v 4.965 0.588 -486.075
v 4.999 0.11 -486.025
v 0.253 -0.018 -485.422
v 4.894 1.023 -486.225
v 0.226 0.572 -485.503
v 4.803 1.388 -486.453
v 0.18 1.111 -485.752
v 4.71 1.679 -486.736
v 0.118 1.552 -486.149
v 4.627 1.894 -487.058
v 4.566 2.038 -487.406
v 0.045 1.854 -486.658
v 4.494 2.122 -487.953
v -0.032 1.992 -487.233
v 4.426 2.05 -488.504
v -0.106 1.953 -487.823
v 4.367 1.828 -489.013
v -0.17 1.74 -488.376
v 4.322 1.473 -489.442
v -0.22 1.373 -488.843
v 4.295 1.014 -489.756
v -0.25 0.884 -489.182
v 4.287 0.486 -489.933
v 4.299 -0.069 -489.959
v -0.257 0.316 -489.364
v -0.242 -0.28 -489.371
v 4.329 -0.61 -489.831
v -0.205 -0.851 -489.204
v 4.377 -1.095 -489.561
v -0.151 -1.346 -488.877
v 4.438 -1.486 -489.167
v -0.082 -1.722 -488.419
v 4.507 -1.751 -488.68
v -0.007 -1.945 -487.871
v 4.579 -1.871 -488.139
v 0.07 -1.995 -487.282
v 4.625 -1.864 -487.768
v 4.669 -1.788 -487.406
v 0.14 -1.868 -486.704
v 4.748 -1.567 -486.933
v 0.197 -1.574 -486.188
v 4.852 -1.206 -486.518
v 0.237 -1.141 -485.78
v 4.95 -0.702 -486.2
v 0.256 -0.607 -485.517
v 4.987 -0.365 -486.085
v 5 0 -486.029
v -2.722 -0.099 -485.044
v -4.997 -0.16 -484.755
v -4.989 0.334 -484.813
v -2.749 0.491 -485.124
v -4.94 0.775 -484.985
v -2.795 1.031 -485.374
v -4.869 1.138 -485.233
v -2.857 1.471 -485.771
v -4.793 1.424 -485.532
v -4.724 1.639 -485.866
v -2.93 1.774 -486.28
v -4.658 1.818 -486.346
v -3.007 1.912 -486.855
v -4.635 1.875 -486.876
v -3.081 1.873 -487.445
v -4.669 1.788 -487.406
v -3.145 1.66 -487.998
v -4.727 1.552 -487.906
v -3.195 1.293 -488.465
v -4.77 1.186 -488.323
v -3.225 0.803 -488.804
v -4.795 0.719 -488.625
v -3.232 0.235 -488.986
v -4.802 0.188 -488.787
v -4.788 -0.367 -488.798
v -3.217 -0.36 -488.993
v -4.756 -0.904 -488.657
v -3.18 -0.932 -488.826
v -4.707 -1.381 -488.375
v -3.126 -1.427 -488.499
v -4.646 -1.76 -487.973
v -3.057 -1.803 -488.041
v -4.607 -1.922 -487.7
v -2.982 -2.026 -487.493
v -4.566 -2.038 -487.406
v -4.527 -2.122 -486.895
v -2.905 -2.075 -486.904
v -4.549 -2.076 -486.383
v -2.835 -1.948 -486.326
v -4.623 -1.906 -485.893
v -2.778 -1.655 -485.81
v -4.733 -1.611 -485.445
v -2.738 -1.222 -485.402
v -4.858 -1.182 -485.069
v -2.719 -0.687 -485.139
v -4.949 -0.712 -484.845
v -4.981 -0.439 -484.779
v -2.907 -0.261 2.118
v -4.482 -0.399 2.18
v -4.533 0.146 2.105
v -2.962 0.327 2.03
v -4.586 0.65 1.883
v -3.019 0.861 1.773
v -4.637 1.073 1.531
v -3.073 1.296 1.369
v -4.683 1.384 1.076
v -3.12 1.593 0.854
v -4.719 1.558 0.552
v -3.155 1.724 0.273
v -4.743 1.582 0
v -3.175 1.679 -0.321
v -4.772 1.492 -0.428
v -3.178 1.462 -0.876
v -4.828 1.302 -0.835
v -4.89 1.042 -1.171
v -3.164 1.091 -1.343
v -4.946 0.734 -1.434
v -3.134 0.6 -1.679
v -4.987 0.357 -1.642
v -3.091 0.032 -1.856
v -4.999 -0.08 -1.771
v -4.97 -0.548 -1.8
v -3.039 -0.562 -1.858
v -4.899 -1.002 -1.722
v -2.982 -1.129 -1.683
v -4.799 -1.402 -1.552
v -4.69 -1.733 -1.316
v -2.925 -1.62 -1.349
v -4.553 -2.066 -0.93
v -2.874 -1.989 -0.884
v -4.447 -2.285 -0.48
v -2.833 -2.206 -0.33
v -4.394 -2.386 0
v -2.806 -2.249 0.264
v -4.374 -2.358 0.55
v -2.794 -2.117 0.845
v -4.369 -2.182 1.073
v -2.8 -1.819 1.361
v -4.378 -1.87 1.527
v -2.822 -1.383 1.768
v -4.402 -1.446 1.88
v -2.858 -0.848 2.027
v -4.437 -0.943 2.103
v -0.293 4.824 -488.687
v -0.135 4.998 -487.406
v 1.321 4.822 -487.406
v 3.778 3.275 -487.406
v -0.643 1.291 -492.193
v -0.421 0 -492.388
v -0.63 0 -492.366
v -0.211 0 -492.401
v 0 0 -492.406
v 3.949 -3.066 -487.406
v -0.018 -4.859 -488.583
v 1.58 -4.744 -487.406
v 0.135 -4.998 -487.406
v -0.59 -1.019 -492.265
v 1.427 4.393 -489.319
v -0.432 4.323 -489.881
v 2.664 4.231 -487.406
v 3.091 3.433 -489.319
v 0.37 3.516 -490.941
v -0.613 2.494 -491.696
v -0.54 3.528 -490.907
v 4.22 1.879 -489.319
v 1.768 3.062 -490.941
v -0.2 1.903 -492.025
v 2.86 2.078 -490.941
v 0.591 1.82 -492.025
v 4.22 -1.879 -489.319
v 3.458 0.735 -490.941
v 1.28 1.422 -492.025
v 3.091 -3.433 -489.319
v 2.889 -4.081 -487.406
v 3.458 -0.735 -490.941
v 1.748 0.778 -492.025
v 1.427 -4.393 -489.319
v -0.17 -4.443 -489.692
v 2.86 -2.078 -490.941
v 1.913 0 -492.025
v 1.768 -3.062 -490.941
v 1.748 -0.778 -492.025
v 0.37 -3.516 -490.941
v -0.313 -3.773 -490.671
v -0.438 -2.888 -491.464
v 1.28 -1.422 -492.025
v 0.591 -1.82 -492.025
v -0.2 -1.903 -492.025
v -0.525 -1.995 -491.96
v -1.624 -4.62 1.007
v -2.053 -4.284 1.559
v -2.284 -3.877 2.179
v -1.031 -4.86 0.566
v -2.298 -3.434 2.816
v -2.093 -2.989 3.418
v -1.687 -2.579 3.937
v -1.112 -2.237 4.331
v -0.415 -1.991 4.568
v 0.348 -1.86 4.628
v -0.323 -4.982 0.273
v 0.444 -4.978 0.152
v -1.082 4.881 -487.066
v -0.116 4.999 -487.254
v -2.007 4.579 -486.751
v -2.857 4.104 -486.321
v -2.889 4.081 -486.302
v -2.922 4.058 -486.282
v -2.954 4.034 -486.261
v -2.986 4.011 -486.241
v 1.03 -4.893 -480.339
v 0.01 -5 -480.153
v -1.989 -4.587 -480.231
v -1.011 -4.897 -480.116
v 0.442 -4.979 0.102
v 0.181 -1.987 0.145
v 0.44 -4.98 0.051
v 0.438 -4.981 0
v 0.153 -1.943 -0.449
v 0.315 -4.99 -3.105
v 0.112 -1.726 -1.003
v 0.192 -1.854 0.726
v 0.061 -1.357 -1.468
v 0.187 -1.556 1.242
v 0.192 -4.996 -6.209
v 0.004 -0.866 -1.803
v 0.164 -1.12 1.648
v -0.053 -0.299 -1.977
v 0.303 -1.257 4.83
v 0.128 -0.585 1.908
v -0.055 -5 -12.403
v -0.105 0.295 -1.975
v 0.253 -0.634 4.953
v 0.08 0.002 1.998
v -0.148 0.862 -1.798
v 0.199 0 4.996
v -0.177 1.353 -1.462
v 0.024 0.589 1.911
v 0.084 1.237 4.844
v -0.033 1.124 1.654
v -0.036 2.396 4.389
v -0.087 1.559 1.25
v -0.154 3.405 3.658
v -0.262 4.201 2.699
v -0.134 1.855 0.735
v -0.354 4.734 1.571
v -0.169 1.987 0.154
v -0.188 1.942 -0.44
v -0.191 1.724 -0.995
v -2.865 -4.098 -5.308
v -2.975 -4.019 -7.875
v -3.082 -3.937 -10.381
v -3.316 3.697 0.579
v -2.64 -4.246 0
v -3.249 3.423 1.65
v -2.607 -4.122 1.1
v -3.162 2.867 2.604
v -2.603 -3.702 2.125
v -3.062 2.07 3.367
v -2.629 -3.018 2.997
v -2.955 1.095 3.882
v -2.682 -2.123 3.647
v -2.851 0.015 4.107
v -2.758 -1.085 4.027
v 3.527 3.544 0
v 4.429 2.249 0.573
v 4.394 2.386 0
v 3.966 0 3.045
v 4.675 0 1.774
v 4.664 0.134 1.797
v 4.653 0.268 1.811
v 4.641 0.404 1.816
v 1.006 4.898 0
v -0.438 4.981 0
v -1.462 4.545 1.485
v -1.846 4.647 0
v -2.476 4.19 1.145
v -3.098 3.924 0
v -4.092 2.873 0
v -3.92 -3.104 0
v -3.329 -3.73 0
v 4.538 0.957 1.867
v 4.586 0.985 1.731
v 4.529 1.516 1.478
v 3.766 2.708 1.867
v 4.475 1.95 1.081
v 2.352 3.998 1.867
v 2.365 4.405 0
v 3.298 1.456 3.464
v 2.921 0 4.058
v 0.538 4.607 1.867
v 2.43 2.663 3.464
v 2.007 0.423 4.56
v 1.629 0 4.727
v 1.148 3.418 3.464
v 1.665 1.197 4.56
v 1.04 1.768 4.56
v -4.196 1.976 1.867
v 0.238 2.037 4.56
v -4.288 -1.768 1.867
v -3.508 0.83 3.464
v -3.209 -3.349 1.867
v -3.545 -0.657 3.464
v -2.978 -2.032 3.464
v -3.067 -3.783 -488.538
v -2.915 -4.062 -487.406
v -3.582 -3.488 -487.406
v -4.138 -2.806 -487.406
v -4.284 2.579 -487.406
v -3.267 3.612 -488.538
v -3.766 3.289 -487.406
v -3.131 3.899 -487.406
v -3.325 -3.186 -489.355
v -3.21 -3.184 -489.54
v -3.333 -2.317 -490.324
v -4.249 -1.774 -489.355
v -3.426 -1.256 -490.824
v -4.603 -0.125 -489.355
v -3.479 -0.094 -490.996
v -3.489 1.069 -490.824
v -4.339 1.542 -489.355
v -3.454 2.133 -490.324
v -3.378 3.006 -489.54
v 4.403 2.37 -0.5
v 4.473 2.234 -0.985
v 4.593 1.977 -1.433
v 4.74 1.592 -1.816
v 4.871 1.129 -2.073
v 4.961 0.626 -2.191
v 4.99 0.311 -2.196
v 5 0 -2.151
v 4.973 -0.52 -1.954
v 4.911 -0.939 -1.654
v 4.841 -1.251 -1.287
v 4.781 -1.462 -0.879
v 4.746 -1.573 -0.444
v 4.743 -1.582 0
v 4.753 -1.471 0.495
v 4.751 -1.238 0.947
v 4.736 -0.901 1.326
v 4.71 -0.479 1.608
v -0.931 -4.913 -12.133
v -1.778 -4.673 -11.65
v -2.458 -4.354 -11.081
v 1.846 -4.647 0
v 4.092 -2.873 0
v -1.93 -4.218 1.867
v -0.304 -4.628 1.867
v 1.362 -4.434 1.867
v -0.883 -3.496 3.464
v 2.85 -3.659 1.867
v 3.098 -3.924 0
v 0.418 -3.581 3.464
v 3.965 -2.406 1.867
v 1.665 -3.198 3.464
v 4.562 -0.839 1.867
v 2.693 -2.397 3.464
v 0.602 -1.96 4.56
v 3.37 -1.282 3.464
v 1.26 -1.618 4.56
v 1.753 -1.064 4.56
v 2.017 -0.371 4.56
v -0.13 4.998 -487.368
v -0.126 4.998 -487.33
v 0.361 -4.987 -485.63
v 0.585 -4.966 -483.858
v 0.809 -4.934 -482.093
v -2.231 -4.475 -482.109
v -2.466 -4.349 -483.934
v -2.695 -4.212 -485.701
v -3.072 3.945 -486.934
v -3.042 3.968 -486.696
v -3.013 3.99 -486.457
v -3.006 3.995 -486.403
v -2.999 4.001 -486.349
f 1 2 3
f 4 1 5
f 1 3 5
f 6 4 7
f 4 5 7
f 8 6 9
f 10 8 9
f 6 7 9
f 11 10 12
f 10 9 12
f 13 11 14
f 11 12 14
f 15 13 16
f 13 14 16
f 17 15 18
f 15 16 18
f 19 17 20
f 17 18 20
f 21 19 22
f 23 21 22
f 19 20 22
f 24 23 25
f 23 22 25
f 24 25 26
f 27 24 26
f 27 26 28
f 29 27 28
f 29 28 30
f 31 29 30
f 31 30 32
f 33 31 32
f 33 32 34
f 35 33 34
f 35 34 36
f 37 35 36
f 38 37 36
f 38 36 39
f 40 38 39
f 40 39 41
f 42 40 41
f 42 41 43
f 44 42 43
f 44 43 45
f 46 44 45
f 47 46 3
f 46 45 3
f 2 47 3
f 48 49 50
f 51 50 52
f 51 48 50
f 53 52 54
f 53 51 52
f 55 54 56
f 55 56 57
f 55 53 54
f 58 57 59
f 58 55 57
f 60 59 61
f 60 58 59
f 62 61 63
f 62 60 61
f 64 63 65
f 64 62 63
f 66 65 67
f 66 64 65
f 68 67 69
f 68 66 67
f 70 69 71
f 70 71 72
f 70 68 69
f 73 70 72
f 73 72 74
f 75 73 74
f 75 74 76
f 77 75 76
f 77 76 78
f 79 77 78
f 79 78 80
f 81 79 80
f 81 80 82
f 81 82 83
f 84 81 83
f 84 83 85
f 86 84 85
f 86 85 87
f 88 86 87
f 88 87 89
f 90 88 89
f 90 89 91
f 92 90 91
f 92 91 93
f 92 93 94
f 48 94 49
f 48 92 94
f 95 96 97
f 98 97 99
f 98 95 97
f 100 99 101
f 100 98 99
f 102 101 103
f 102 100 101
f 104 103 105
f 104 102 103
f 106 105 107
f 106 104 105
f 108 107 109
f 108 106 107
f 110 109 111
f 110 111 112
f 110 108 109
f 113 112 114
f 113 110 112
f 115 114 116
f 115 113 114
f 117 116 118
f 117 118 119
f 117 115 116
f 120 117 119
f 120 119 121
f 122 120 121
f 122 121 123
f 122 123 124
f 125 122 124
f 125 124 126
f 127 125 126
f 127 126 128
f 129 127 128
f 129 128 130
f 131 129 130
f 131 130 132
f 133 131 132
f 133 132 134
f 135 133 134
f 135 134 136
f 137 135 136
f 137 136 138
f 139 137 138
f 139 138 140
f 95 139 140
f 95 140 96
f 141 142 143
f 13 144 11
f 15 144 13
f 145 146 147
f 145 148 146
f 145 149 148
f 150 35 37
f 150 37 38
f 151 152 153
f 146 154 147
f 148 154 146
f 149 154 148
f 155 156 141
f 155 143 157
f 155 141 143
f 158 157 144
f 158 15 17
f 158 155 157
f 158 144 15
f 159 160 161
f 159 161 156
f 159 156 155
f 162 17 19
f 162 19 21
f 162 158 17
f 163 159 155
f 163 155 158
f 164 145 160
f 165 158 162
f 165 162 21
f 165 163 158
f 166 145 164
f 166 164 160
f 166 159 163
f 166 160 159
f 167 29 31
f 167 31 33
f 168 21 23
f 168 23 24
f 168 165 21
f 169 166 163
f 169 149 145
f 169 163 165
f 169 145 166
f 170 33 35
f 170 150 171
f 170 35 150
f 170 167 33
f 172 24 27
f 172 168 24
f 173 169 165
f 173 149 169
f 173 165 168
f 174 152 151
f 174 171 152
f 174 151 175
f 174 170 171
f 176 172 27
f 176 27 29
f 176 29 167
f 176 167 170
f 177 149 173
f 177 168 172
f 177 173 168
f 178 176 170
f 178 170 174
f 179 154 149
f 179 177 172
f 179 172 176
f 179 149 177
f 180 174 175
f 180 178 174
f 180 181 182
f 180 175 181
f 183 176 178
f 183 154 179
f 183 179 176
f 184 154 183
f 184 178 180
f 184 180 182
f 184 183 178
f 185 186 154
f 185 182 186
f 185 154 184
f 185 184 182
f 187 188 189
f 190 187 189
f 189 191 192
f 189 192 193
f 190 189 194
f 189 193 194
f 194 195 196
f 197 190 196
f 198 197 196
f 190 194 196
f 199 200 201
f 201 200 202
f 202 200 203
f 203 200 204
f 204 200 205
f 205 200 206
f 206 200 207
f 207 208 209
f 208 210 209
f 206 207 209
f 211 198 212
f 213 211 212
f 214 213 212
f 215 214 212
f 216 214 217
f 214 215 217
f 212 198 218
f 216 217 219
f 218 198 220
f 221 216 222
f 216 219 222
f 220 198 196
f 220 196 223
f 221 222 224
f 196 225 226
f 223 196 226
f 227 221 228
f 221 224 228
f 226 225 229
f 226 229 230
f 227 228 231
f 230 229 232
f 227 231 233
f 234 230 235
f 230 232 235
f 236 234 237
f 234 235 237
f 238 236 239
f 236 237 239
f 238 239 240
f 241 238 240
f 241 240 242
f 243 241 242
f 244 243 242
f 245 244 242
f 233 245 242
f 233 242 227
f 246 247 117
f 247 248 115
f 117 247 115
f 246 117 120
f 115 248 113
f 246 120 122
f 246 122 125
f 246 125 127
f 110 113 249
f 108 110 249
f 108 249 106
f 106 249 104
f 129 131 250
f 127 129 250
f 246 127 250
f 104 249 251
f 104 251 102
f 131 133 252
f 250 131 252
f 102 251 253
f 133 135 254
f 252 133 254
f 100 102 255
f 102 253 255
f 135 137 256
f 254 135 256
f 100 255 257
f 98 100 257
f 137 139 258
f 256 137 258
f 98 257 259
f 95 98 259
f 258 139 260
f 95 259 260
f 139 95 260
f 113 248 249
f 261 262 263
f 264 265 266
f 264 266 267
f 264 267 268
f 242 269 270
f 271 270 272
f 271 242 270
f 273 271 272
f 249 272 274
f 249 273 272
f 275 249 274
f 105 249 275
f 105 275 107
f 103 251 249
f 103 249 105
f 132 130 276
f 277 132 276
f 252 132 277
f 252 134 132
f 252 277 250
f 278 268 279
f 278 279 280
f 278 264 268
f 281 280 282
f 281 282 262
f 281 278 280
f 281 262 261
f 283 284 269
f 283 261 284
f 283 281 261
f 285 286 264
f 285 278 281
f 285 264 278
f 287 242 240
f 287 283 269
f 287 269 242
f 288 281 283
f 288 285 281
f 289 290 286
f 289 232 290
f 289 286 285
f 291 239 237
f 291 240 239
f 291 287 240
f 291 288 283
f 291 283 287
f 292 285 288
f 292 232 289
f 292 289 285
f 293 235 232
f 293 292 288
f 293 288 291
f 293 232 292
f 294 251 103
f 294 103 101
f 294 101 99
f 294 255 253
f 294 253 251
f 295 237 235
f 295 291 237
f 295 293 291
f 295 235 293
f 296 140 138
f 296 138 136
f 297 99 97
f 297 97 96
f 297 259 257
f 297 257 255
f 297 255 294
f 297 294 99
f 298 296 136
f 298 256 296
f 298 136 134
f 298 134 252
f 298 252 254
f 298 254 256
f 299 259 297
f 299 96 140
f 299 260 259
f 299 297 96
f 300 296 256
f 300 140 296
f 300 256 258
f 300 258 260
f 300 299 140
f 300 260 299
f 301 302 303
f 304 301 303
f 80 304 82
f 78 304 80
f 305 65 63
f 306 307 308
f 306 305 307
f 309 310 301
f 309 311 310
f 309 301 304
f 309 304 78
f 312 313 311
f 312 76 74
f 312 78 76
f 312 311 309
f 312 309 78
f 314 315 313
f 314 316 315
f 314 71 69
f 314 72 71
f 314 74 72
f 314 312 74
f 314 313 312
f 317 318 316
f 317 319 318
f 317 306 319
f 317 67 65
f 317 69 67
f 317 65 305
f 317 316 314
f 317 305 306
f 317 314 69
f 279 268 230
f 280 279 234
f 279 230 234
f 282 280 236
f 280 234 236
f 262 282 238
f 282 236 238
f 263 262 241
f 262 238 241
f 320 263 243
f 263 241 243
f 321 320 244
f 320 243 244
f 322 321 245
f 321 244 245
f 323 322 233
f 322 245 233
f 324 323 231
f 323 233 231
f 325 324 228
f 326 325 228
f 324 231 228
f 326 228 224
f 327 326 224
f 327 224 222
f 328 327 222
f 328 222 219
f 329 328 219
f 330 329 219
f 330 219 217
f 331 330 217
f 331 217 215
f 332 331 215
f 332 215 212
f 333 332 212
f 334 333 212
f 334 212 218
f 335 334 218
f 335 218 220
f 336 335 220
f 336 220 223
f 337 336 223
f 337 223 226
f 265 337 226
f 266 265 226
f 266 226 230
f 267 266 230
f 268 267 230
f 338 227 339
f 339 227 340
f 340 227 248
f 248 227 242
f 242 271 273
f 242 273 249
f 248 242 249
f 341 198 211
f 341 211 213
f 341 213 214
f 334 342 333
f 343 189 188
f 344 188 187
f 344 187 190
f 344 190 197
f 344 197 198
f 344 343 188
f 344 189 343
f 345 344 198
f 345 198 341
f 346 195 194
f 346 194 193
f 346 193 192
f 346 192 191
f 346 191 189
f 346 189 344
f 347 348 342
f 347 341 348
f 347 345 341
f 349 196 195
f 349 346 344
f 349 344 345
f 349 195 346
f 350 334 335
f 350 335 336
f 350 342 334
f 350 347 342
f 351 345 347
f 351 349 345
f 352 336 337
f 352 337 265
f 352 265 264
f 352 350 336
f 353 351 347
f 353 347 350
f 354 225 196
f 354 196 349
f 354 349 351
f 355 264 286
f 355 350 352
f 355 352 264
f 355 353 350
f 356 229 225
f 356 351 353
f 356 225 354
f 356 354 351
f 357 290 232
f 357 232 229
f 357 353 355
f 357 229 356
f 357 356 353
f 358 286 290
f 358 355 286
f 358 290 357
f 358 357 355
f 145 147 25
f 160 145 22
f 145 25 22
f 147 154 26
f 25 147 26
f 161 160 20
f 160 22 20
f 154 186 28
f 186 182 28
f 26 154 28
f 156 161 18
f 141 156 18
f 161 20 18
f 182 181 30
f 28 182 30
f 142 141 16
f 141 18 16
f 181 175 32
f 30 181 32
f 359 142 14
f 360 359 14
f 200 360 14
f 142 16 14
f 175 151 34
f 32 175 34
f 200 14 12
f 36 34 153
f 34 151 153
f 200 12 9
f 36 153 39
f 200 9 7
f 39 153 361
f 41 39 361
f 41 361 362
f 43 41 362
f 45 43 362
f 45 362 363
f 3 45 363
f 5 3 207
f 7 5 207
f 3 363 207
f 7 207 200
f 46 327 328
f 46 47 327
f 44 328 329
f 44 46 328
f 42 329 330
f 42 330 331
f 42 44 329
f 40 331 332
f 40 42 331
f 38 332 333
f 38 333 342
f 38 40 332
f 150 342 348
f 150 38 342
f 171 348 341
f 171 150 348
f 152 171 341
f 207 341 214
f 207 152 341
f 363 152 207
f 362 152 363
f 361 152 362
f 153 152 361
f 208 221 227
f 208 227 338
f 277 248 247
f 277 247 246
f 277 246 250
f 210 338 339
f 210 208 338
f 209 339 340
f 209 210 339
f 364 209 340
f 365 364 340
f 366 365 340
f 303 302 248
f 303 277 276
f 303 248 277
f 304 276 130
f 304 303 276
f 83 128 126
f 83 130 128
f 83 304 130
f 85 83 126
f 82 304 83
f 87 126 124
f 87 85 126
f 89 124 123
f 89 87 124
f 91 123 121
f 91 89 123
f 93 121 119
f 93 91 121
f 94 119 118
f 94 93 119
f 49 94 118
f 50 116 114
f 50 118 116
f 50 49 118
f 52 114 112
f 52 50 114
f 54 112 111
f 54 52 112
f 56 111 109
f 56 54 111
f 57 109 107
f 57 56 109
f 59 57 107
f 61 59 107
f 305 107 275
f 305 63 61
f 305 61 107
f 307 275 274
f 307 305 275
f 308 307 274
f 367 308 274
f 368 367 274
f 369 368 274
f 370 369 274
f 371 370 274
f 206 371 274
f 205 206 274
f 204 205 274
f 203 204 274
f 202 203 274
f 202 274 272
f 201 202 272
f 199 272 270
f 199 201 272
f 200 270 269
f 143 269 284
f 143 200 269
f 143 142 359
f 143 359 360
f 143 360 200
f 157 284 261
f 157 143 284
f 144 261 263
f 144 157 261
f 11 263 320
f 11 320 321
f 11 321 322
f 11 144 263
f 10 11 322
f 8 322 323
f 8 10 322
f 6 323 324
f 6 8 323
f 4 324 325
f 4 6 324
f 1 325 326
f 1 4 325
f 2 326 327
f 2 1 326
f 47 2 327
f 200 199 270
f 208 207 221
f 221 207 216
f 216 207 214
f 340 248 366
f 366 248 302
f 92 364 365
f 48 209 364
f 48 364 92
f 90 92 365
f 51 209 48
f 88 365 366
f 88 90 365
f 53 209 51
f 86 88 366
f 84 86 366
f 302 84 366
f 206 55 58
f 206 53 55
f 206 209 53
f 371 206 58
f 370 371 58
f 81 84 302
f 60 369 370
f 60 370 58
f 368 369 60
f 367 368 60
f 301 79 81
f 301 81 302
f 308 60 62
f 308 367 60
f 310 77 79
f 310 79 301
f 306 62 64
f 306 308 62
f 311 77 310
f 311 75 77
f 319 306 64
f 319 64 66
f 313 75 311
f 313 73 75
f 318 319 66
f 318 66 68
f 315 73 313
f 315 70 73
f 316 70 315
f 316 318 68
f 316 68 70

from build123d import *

# Parameters (mm, degrees)
SKETCH1_R               = 5
DOME1_FACE_RADIUS       = 5
DOME1_HEIGHT            = 5
DOME2_FACE_RADIUS       = 5
DOME2_HEIGHT            = 5
CUT_EXTRUDE2_DEPTH      = 5.404285297
CUT_EXTRUDE2_DEPTH_BACK = 289.404285297
SKETCH6_R               = 2
CUT_EXTRUDE3_DEPTH      = 68.142339226
CUT_EXTRUDE3_DEPTH_BACK = 6.72259346
CUT_EXTRUDE5_DEPTH      = 5.047319689
CUT_EXTRUDE5_DEPTH_BACK = 410.929194171
SKETCH8_R               = 2
CUT_EXTRUDE6_DEPTH      = 6.613212564
CUT_EXTRUDE6_DEPTH_BACK = 25.970742243


with BuildPart() as part:
    # Sweep1: sweep along a path in Sketch3
    with BuildLine(Plane(origin=(0, 0, 0), x_dir=(0, 0, -1), z_dir=(1, 0, 0))) as sweep1_path:
        Line((0, 0), (487.405602585, 0))
    # Sketch1 → Sweep1 (sweep)
    with BuildSketch(Plane.XY):
        Circle(SKETCH1_R)
    sweep(path=sweep1_path.line)

    # Dome1: a dome of height H over a round flat face of radius A is a cap of a sphere of radius (A * A + H * H) / (2 * H)
    dome1_r = (DOME1_FACE_RADIUS * DOME1_FACE_RADIUS + DOME1_HEIGHT * DOME1_HEIGHT) / (2 * DOME1_HEIGHT)
    dome1_base = Plane((0, 0, 0), z_dir=(0, 0, 1))
    with Locations(dome1_base.offset(DOME1_HEIGHT - dome1_r)):
        dome1_ball = Sphere(dome1_r, mode=Mode.PRIVATE)
    add(split(dome1_ball, bisect_by=dome1_base, keep=Keep.TOP, mode=Mode.PRIVATE))

    # Dome2: a dome of height H over a round flat face of radius A is a cap of a sphere of radius (A * A + H * H) / (2 * H)
    dome2_r = (DOME2_FACE_RADIUS * DOME2_FACE_RADIUS + DOME2_HEIGHT * DOME2_HEIGHT) / (2 * DOME2_HEIGHT)
    dome2_base = Plane((0, 0, -487.405602585), z_dir=(0, 0, -1))
    with Locations(dome2_base.offset(DOME2_HEIGHT - dome2_r)):
        dome2_ball = Sphere(dome2_r, mode=Mode.PRIVATE)
    add(split(dome2_ball, bisect_by=dome2_base, keep=Keep.TOP, mode=Mode.PRIVATE))

    # Sketch5 → Cut-Extrude2 (cut, two sides)
    with BuildSketch(Plane(origin=(-26.571757691, 229.275990101, -160.273085877), x_dir=(0.995516802, 0.078714536, -0.052443479), z_dir=(-0.094561415, 0.81592879, -0.570366854))) as cut_extrude2_sk:
        Polygon((22.843463066, 396.275337774), (22.1233695, 404.242954928), (25.111191904, 404.512986939), (25.831285469, 396.545369785), align=None)
    extrude(amount=CUT_EXTRUDE2_DEPTH, mode=Mode.SUBTRACT)
    extrude(cut_extrude2_sk.sketch, amount=-CUT_EXTRUDE2_DEPTH_BACK, mode=Mode.SUBTRACT)

    # Sketch6 → Cut-Extrude3 (cut, two sides)
    with BuildSketch(Plane(origin=(60.907834636, 1.64848777, -7.739724677), x_dir=(0.126296417, -0.009108801, 0.991950727), z_dir=(-0.991665366, -0.026839704, 0.126013623))) as cut_extrude3_sk:
        with Locations((-483.482341842, -6.054864831)):
            Circle(SKETCH6_R)
    extrude(amount=CUT_EXTRUDE3_DEPTH, mode=Mode.SUBTRACT)
    extrude(cut_extrude3_sk.sketch, amount=-CUT_EXTRUDE3_DEPTH_BACK, mode=Mode.SUBTRACT)

    # Sketch7 → Cut-Extrude5 (cut, two sides)
    with BuildSketch(Plane(origin=(-0.052668832, 1.714434817, 2.461288129), x_dir=(0.999845409, 0.010828351, 0.013852985), z_dir=(-0.017556277, 0.571478272, 0.820429376))) as cut_extrude5_sk:
        Polygon((-2.594541679, -4.452930477), (0.392284328, -4.172091725), (-0.280838752, 2.986826007), (-3.267664759, 2.705987255), align=None)
    extrude(amount=CUT_EXTRUDE5_DEPTH, mode=Mode.SUBTRACT)
    extrude(cut_extrude5_sk.sketch, amount=-CUT_EXTRUDE5_DEPTH_BACK, mode=Mode.SUBTRACT)

    # Sketch8 → Cut-Extrude6 (cut, two sides)
    with BuildSketch(Plane(origin=(0, 0, 0), x_dir=(0.039771244, 0.001105127, 0.9992082), z_dir=(-0.995364213, -0.087594482, 0.039715122))) as cut_extrude6_sk:
        Circle(SKETCH8_R)
    extrude(amount=CUT_EXTRUDE6_DEPTH, mode=Mode.SUBTRACT)
    extrude(cut_extrude6_sk.sketch, amount=-CUT_EXTRUDE6_DEPTH_BACK, mode=Mode.SUBTRACT)


solid = part.part
